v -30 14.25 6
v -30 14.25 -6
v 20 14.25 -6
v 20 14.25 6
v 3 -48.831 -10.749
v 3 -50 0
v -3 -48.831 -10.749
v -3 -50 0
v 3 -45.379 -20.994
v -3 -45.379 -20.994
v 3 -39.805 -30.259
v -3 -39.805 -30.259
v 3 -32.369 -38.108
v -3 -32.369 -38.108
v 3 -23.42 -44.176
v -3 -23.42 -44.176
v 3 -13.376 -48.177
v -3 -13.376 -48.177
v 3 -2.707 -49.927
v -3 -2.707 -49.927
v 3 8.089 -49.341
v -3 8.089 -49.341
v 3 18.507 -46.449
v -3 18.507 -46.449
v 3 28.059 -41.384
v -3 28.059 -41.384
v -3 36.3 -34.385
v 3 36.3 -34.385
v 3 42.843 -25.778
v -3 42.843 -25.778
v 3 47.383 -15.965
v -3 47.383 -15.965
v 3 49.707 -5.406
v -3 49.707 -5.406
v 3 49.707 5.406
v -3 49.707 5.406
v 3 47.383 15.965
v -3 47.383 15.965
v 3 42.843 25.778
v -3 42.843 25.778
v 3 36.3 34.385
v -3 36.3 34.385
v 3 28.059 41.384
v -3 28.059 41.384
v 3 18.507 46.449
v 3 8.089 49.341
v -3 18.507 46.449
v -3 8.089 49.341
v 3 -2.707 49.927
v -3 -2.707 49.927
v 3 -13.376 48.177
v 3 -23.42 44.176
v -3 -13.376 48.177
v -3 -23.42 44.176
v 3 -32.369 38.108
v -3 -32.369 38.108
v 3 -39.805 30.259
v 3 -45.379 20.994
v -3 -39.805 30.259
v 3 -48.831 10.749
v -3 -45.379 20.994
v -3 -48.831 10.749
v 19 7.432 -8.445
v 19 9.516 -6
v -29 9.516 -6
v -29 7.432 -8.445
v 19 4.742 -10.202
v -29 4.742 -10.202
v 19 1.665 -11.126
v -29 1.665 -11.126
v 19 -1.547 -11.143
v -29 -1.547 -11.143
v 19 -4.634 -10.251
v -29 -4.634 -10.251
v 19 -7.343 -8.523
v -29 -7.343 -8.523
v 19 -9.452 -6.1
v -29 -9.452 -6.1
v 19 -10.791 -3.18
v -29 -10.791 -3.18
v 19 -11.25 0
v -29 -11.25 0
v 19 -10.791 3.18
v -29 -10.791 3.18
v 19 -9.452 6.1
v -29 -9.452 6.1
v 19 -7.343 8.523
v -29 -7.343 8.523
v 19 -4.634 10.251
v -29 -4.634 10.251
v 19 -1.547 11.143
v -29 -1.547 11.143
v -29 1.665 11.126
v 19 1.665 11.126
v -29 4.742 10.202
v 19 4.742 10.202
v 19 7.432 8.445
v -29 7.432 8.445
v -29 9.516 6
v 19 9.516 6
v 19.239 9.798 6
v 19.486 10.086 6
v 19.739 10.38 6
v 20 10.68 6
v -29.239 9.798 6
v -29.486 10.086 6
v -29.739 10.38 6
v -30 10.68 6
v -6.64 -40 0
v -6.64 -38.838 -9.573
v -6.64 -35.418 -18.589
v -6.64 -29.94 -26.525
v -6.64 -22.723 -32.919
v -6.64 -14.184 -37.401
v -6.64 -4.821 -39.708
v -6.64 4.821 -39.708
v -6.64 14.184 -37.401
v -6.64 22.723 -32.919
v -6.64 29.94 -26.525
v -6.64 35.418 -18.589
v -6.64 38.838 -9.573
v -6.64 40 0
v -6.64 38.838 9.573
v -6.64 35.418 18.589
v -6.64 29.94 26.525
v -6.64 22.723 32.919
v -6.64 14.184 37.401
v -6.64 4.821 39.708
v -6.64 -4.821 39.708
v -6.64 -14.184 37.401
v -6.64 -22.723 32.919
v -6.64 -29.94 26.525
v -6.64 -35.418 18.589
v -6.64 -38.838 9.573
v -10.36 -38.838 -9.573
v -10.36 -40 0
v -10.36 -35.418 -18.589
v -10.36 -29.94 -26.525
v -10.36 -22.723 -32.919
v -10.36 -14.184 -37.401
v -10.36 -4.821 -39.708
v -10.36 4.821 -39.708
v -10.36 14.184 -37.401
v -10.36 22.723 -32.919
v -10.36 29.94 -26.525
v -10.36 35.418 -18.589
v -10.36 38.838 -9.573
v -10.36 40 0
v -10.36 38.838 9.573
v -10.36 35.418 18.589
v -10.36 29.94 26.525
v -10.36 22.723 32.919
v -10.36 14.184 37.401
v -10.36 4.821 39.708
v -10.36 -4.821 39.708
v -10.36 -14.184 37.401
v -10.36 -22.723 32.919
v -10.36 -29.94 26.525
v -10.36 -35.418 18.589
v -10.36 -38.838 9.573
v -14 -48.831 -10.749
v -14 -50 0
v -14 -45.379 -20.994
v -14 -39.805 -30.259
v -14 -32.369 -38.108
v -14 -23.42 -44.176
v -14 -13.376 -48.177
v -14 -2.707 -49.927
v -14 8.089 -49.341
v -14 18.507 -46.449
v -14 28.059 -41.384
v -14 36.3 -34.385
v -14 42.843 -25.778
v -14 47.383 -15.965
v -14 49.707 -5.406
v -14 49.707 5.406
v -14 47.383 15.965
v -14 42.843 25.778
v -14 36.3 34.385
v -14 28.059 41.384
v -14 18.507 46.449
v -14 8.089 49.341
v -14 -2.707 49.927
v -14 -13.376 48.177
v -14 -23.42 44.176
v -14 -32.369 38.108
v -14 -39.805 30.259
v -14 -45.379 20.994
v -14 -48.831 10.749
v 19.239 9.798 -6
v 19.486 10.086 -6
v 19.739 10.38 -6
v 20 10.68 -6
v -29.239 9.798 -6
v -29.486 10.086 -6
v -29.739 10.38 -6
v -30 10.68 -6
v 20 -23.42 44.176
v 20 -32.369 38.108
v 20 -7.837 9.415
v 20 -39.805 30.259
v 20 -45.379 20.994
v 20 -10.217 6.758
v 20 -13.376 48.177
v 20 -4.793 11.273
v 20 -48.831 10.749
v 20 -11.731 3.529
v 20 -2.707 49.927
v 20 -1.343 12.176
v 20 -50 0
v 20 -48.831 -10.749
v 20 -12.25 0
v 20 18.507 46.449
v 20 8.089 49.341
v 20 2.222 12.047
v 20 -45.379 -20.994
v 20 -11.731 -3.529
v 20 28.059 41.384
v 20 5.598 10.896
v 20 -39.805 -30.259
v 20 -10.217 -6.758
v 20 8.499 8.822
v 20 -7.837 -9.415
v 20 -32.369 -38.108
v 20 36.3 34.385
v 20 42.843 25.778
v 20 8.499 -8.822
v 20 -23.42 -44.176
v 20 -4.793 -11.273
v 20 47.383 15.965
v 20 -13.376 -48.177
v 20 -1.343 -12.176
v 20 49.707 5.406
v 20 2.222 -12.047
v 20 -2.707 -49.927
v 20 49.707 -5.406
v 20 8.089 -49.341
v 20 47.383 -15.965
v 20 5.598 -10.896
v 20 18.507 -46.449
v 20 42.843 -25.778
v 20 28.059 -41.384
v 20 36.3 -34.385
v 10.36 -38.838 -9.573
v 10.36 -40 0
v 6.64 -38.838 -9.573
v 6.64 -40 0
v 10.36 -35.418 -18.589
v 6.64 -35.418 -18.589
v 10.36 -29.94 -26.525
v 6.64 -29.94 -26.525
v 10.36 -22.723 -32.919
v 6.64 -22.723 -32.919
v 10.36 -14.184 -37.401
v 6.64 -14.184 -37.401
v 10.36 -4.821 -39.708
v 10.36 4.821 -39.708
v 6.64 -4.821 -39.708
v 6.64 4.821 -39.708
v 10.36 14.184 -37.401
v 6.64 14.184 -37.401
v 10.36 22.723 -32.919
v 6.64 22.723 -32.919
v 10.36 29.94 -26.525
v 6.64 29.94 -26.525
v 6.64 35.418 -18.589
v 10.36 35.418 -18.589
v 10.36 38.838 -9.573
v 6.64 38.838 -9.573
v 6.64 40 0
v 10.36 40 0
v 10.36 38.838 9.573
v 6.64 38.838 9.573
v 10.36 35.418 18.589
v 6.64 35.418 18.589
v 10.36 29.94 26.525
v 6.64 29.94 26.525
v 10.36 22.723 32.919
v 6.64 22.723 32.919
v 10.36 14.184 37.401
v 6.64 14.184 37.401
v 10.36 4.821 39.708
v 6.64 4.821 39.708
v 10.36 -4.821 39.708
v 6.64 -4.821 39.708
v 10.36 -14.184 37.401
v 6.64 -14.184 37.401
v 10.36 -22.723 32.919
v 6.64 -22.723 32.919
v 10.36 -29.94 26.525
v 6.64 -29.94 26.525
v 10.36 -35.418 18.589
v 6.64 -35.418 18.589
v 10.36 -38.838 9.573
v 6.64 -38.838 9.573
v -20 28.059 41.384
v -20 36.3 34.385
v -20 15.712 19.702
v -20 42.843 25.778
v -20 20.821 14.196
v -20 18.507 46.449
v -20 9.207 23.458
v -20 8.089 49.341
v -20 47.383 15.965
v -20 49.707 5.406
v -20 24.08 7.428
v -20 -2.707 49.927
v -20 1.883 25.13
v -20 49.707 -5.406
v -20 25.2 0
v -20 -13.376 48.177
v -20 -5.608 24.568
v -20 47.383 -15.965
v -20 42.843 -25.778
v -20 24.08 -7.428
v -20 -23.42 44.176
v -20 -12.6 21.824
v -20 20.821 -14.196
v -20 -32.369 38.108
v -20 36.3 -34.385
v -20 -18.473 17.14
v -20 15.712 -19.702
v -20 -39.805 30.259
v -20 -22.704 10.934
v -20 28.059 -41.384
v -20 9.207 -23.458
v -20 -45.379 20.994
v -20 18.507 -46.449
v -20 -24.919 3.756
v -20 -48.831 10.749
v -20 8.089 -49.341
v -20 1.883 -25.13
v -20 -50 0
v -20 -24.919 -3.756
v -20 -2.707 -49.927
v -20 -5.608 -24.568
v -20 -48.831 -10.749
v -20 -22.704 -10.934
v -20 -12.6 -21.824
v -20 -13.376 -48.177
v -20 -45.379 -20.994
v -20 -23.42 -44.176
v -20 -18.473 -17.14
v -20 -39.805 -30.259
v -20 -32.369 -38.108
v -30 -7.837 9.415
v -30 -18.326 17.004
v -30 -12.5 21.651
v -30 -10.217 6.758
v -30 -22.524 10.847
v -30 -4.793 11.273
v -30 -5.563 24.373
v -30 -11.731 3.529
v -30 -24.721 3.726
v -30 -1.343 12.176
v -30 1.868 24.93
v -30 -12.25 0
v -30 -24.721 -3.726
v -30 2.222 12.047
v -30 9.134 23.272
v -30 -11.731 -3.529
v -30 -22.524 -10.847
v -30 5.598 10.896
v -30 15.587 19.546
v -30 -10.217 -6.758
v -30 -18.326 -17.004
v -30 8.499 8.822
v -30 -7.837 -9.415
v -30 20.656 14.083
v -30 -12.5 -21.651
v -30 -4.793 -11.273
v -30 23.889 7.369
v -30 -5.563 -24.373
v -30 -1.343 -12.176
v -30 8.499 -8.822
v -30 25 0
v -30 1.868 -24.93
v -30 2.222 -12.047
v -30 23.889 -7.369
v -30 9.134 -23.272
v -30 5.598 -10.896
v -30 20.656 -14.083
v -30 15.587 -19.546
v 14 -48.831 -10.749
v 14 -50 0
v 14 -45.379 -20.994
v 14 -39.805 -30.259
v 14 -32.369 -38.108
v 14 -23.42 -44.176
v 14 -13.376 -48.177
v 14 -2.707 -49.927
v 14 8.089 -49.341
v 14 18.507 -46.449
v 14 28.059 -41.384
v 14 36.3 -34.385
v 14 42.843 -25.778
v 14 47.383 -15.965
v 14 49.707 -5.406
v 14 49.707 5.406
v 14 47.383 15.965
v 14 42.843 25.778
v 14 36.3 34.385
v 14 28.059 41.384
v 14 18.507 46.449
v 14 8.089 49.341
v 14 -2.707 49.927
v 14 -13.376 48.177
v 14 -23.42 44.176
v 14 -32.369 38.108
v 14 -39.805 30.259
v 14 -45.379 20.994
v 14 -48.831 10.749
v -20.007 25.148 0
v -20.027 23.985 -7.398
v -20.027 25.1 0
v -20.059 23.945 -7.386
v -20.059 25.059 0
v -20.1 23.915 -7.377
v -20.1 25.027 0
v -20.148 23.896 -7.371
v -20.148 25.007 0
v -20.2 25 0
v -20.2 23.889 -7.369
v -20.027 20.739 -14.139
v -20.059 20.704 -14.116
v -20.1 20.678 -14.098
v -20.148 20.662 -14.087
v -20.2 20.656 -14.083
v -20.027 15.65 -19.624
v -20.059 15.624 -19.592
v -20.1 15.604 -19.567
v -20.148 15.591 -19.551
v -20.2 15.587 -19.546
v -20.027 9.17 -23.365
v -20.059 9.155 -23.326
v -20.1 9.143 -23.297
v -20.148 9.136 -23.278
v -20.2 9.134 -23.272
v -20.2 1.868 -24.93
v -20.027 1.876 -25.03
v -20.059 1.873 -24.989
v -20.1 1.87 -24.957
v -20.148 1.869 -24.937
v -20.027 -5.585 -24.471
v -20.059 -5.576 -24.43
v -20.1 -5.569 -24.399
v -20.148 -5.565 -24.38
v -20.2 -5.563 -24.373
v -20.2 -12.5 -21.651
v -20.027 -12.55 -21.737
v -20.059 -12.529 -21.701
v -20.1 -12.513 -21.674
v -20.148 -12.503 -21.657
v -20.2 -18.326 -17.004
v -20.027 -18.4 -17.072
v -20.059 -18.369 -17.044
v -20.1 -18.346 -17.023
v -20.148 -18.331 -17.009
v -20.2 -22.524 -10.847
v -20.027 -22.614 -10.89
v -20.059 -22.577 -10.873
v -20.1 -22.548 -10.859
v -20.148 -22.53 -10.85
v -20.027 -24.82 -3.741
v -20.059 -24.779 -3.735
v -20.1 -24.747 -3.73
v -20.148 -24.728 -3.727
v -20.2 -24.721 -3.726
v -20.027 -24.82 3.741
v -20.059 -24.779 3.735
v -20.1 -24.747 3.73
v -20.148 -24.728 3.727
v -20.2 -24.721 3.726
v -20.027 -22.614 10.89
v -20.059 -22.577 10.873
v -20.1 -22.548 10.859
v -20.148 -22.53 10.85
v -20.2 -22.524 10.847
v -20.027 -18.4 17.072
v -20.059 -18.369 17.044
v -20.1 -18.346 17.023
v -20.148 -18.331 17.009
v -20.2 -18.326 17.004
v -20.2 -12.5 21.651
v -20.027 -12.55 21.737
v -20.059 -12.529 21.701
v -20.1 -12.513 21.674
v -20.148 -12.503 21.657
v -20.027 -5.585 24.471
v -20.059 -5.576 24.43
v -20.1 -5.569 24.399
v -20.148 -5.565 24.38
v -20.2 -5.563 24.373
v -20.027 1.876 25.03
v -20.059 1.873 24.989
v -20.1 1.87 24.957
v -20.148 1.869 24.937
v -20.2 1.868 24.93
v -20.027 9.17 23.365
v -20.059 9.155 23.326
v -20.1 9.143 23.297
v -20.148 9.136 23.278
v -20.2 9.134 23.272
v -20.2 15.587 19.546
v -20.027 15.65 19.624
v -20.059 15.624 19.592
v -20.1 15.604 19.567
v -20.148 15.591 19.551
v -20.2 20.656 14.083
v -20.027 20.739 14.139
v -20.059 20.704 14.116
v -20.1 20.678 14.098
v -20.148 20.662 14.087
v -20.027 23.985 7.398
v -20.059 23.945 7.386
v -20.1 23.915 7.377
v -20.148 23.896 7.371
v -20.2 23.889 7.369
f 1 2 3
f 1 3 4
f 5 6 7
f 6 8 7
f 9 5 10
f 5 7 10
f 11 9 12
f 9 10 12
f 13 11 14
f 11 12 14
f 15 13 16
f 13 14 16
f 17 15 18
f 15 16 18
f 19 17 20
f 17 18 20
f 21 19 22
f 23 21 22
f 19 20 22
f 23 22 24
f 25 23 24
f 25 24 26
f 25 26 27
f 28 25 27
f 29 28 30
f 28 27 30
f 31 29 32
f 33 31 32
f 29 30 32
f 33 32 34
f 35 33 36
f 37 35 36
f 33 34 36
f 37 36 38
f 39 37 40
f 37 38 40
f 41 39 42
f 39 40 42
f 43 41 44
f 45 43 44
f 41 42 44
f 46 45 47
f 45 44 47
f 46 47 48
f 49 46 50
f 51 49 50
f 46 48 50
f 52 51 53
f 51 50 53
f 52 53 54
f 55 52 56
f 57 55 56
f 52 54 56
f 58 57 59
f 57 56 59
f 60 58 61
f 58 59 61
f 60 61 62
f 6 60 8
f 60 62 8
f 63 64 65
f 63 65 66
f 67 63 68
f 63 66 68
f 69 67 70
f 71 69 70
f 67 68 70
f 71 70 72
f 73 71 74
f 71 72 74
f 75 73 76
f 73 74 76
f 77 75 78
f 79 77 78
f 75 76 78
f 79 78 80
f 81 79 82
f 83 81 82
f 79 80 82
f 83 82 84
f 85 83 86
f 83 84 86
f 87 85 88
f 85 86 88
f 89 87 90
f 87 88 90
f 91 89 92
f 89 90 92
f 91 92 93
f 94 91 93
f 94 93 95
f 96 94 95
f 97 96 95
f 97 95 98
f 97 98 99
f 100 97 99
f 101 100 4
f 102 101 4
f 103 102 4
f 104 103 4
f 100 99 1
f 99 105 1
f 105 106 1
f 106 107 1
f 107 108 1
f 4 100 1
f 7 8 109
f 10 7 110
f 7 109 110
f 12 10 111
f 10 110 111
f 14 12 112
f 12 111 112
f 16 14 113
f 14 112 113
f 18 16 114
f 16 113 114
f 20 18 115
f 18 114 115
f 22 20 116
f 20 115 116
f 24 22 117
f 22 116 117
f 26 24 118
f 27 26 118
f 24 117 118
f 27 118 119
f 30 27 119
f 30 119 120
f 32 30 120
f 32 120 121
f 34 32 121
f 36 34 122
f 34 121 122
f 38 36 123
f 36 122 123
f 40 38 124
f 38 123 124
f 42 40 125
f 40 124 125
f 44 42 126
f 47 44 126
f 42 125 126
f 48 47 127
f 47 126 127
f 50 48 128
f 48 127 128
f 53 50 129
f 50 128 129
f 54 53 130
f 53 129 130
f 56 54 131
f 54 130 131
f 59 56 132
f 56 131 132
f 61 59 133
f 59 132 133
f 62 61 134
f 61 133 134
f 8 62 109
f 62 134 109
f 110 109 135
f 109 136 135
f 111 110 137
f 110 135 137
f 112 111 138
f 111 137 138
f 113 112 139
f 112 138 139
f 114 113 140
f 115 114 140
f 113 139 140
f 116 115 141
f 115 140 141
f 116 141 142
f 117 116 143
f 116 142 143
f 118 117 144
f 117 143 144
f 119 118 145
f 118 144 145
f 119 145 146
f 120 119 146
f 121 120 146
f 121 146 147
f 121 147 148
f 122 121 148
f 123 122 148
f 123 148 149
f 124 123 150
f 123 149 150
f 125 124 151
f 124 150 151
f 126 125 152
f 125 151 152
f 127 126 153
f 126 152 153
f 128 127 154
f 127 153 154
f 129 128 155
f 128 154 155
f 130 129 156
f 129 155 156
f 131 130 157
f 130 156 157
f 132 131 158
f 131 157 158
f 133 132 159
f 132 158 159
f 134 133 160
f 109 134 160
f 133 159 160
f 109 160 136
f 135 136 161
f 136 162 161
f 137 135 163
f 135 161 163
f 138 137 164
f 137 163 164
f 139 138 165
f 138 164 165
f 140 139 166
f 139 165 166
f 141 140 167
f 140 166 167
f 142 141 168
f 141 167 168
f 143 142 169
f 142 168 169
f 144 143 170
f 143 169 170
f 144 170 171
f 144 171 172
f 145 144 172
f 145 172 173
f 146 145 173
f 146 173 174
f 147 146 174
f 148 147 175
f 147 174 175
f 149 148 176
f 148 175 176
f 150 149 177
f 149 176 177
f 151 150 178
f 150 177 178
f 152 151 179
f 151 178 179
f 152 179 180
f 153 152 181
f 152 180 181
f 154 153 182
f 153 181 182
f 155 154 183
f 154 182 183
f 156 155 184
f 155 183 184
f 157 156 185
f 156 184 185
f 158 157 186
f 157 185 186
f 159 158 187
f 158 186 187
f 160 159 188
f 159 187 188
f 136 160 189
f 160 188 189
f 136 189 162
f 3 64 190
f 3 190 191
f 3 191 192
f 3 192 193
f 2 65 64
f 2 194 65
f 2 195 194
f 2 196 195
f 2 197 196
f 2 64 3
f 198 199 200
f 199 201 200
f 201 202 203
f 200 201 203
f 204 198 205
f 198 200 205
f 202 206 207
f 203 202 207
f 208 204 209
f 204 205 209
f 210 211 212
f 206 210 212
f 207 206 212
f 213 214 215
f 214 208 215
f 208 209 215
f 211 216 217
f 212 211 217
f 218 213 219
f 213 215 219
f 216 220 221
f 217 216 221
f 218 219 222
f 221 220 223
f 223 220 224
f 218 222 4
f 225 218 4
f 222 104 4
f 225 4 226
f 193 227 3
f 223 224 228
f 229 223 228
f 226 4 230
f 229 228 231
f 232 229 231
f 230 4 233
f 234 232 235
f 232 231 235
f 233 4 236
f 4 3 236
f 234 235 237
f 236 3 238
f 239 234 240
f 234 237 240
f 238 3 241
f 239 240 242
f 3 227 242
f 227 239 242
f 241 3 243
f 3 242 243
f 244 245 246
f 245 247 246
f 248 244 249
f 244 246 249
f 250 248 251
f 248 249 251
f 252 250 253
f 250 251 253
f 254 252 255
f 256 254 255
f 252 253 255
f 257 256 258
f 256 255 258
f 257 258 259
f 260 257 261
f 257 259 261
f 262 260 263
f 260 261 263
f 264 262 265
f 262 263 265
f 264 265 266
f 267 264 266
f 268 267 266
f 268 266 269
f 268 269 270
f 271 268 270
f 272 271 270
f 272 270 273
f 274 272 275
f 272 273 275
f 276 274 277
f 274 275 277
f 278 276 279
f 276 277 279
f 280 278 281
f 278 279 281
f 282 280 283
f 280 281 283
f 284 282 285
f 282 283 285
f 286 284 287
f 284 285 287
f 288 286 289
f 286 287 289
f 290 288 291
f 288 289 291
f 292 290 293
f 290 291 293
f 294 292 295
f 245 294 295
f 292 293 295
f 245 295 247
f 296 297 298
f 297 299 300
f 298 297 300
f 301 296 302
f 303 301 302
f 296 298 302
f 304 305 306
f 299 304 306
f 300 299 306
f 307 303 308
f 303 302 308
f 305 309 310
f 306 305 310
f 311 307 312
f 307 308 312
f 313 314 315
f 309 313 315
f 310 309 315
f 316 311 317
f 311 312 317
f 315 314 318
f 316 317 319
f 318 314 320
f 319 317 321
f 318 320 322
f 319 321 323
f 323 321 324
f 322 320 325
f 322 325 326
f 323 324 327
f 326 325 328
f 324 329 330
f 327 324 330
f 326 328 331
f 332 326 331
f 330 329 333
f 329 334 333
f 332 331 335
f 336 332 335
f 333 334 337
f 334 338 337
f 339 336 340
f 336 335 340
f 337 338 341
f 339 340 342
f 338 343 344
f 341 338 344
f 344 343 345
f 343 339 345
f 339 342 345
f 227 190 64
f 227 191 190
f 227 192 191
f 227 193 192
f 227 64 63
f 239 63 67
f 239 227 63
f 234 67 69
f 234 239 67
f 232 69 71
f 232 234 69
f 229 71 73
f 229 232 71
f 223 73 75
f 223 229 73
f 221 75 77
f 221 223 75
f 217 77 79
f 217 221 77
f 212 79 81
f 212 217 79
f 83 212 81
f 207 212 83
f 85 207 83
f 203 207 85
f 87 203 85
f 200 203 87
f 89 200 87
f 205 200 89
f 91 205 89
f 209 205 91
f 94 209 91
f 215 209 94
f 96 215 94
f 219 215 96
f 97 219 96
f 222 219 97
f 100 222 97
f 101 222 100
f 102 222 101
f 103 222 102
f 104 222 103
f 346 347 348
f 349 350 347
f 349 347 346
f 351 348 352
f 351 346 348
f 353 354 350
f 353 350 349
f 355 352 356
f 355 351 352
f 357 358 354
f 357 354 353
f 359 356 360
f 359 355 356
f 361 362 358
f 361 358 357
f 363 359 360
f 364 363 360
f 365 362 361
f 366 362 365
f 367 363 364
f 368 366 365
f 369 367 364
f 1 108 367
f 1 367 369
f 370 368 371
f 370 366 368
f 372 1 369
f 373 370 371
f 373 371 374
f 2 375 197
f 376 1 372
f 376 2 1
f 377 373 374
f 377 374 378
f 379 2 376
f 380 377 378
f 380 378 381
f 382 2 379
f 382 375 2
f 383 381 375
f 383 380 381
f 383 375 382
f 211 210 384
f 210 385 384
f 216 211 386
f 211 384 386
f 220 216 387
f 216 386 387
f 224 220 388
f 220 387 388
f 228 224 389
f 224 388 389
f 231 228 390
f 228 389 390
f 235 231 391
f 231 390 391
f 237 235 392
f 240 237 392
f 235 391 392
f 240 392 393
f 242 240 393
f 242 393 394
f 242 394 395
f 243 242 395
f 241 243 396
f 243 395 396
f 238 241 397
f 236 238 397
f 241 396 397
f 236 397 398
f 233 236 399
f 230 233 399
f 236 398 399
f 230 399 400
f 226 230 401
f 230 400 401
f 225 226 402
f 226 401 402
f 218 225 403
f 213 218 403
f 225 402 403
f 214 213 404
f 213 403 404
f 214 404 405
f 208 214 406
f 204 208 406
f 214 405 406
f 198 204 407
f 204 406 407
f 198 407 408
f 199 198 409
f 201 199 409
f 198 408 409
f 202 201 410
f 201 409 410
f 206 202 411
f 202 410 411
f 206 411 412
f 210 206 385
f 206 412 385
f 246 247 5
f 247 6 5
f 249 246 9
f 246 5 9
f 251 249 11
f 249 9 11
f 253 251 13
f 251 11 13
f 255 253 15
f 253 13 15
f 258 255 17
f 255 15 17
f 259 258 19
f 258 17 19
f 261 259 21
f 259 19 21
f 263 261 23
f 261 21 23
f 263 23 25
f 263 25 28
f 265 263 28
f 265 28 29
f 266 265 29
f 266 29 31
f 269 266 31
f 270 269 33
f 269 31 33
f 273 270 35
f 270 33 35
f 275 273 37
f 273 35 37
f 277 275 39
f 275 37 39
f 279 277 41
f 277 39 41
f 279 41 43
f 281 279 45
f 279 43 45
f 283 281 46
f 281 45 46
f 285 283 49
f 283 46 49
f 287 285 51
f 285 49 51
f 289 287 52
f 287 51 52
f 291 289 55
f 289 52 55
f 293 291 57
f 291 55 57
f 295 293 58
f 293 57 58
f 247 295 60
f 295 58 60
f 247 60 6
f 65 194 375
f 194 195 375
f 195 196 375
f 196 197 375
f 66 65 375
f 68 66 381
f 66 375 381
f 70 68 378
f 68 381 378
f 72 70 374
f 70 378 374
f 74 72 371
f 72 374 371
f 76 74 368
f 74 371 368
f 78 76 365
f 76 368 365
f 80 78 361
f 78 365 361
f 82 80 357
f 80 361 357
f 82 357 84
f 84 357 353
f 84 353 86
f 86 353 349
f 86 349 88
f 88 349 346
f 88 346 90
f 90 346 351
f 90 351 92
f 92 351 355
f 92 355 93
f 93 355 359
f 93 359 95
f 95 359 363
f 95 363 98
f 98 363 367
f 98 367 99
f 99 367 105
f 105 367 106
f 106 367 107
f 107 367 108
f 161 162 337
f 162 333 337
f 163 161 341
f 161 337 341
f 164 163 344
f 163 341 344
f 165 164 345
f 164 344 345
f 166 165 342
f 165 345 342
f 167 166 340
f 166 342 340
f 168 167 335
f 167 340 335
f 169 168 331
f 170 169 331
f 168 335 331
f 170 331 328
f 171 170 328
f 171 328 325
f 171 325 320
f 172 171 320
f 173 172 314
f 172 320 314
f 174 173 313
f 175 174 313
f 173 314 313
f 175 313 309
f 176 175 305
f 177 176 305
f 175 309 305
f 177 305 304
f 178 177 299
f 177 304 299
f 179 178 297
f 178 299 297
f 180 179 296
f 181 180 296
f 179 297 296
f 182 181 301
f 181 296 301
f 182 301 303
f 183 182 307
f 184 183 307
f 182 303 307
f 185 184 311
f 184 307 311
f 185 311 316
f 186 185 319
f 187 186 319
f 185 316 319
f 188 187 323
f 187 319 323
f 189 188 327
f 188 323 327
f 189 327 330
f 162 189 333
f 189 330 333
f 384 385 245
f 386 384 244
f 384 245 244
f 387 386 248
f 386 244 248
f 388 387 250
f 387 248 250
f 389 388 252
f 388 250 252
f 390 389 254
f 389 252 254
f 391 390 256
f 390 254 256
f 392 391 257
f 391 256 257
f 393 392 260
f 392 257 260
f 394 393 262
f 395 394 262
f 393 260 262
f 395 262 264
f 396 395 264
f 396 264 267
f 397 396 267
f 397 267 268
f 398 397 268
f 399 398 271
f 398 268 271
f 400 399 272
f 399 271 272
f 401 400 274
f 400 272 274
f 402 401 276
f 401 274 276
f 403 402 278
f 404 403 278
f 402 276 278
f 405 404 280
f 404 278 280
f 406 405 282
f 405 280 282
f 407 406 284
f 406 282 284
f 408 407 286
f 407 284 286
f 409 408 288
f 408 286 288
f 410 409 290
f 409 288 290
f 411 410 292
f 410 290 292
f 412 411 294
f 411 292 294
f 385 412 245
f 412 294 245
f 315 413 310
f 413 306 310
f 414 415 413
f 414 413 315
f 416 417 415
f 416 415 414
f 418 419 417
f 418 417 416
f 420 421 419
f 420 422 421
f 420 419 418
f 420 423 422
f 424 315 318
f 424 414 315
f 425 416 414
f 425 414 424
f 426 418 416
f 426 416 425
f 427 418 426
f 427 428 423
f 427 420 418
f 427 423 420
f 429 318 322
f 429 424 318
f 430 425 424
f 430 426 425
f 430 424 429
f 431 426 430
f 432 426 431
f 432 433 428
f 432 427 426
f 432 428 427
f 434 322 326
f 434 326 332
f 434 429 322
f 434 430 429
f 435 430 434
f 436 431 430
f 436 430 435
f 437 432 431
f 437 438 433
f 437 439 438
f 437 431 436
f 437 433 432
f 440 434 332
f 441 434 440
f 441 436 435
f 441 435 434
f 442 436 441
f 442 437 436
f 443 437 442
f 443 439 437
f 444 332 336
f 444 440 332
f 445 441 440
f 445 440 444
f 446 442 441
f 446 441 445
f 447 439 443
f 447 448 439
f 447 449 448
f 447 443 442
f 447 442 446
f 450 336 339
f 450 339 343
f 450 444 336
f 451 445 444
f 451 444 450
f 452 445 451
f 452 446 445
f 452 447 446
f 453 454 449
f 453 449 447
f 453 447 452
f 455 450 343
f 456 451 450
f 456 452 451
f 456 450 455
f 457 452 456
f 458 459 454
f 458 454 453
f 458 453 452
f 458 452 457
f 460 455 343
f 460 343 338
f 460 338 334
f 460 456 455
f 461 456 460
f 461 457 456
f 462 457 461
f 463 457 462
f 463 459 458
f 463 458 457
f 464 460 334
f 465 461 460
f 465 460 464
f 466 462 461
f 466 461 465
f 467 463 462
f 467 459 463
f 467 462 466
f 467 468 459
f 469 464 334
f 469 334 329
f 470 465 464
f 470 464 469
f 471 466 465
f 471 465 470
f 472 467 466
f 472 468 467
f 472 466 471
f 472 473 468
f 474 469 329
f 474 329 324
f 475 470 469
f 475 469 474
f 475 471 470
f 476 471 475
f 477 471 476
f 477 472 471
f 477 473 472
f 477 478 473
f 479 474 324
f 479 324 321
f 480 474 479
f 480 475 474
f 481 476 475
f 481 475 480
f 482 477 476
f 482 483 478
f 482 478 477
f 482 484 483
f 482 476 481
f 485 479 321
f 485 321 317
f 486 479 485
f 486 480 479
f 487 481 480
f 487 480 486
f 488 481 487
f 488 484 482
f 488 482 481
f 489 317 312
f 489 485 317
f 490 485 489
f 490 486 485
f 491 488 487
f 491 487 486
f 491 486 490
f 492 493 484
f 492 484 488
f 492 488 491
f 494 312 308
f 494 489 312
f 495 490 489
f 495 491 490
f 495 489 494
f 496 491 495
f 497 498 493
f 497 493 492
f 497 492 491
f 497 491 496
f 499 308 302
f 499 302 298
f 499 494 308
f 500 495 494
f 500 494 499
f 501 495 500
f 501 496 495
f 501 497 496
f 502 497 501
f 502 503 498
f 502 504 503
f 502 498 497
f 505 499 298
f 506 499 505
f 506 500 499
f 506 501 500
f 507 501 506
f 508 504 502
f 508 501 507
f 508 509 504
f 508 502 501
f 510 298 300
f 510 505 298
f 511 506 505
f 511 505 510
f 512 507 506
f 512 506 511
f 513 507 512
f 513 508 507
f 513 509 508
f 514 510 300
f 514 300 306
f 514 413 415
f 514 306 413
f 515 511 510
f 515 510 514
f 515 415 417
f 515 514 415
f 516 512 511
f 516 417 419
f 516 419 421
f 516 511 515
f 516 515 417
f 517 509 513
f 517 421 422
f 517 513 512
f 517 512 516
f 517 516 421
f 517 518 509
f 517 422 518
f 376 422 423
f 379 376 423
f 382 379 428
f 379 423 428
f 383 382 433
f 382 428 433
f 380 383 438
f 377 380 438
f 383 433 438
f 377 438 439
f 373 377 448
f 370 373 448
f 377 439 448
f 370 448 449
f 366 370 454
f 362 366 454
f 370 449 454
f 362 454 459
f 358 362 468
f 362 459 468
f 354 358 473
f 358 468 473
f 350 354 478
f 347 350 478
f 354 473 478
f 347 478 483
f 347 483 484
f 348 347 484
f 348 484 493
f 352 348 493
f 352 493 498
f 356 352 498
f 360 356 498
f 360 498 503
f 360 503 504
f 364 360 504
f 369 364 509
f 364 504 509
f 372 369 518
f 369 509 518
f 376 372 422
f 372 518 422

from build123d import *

# Parameters (mm, degrees)
SKETCH2_R           = 25
BOSS_EXTRUDE1_DEPTH = 10
SKETCH4_R           = 11.25
SKETCH4_W           = 12
SKETCH4_H           = 6
CUT_EXTRUDE1_DEPTH  = 87.602540378
FILLET1_R           = 0.2
CHAMFER1_SIZE       = 1
CHAMFER2_SIZE       = 1


with BuildPart() as part:
    # Sketch1 → Revolve12 (revolve)
    with BuildSketch(Plane.XY, mode=Mode.PRIVATE) as revolve12_sk:
        Polygon((3, 50), (-3, 50), (-6.639702343, 40), (-10.360297657, 40), (-14, 50), (-20, 50), (-20, 0), (20, 0), (20, 50), (14, 50), (10.360297657, 40), (6.639702343, 40), align=None)
    revolve(revolve12_sk.sketch.rotate(Axis((-20, 0, 0), (1, 0, 0)), 180), axis=Axis((-20, 0, 0), (1, 0, 0)))

    # Sketch2 → Boss-Extrude1 (add)
    with BuildSketch(Plane.ZY.offset(20)):
        with Locations(Location((0, 0, 0), (0, 0, 90))):
            Circle(SKETCH2_R)
    extrude(amount=BOSS_EXTRUDE1_DEPTH)

    # Sketch4 → Cut-Extrude1 (cut, through all)
    with BuildSketch(Plane.ZY.offset(30)):
        Circle(SKETCH4_R)
        with Locations((0, 11.25)):
            Rectangle(SKETCH4_W, SKETCH4_H)
    extrude(amount=-CUT_EXTRUDE1_DEPTH, mode=Mode.SUBTRACT)

    # Fillet1
    fillet1_edges = [part.edges().sort_by_distance(p)[0] for p in [
        (-20, -25, 0),
    ]]
    fillet(fillet1_edges, radius=FILLET1_R)

    # Chamfer1
    chamfer1_edges = [part.edges().sort_by_distance(p)[0] for p in [
        (20, -11.25, 0),
    ]]
    chamfer(chamfer1_edges, length=CHAMFER1_SIZE)

    # Chamfer2
    chamfer2_edges = [part.edges().sort_by_distance(p)[0] for p in [
        (-30, -11.25, 0),
    ]]
    chamfer(chamfer2_edges, length=CHAMFER2_SIZE)


solid = part.part
